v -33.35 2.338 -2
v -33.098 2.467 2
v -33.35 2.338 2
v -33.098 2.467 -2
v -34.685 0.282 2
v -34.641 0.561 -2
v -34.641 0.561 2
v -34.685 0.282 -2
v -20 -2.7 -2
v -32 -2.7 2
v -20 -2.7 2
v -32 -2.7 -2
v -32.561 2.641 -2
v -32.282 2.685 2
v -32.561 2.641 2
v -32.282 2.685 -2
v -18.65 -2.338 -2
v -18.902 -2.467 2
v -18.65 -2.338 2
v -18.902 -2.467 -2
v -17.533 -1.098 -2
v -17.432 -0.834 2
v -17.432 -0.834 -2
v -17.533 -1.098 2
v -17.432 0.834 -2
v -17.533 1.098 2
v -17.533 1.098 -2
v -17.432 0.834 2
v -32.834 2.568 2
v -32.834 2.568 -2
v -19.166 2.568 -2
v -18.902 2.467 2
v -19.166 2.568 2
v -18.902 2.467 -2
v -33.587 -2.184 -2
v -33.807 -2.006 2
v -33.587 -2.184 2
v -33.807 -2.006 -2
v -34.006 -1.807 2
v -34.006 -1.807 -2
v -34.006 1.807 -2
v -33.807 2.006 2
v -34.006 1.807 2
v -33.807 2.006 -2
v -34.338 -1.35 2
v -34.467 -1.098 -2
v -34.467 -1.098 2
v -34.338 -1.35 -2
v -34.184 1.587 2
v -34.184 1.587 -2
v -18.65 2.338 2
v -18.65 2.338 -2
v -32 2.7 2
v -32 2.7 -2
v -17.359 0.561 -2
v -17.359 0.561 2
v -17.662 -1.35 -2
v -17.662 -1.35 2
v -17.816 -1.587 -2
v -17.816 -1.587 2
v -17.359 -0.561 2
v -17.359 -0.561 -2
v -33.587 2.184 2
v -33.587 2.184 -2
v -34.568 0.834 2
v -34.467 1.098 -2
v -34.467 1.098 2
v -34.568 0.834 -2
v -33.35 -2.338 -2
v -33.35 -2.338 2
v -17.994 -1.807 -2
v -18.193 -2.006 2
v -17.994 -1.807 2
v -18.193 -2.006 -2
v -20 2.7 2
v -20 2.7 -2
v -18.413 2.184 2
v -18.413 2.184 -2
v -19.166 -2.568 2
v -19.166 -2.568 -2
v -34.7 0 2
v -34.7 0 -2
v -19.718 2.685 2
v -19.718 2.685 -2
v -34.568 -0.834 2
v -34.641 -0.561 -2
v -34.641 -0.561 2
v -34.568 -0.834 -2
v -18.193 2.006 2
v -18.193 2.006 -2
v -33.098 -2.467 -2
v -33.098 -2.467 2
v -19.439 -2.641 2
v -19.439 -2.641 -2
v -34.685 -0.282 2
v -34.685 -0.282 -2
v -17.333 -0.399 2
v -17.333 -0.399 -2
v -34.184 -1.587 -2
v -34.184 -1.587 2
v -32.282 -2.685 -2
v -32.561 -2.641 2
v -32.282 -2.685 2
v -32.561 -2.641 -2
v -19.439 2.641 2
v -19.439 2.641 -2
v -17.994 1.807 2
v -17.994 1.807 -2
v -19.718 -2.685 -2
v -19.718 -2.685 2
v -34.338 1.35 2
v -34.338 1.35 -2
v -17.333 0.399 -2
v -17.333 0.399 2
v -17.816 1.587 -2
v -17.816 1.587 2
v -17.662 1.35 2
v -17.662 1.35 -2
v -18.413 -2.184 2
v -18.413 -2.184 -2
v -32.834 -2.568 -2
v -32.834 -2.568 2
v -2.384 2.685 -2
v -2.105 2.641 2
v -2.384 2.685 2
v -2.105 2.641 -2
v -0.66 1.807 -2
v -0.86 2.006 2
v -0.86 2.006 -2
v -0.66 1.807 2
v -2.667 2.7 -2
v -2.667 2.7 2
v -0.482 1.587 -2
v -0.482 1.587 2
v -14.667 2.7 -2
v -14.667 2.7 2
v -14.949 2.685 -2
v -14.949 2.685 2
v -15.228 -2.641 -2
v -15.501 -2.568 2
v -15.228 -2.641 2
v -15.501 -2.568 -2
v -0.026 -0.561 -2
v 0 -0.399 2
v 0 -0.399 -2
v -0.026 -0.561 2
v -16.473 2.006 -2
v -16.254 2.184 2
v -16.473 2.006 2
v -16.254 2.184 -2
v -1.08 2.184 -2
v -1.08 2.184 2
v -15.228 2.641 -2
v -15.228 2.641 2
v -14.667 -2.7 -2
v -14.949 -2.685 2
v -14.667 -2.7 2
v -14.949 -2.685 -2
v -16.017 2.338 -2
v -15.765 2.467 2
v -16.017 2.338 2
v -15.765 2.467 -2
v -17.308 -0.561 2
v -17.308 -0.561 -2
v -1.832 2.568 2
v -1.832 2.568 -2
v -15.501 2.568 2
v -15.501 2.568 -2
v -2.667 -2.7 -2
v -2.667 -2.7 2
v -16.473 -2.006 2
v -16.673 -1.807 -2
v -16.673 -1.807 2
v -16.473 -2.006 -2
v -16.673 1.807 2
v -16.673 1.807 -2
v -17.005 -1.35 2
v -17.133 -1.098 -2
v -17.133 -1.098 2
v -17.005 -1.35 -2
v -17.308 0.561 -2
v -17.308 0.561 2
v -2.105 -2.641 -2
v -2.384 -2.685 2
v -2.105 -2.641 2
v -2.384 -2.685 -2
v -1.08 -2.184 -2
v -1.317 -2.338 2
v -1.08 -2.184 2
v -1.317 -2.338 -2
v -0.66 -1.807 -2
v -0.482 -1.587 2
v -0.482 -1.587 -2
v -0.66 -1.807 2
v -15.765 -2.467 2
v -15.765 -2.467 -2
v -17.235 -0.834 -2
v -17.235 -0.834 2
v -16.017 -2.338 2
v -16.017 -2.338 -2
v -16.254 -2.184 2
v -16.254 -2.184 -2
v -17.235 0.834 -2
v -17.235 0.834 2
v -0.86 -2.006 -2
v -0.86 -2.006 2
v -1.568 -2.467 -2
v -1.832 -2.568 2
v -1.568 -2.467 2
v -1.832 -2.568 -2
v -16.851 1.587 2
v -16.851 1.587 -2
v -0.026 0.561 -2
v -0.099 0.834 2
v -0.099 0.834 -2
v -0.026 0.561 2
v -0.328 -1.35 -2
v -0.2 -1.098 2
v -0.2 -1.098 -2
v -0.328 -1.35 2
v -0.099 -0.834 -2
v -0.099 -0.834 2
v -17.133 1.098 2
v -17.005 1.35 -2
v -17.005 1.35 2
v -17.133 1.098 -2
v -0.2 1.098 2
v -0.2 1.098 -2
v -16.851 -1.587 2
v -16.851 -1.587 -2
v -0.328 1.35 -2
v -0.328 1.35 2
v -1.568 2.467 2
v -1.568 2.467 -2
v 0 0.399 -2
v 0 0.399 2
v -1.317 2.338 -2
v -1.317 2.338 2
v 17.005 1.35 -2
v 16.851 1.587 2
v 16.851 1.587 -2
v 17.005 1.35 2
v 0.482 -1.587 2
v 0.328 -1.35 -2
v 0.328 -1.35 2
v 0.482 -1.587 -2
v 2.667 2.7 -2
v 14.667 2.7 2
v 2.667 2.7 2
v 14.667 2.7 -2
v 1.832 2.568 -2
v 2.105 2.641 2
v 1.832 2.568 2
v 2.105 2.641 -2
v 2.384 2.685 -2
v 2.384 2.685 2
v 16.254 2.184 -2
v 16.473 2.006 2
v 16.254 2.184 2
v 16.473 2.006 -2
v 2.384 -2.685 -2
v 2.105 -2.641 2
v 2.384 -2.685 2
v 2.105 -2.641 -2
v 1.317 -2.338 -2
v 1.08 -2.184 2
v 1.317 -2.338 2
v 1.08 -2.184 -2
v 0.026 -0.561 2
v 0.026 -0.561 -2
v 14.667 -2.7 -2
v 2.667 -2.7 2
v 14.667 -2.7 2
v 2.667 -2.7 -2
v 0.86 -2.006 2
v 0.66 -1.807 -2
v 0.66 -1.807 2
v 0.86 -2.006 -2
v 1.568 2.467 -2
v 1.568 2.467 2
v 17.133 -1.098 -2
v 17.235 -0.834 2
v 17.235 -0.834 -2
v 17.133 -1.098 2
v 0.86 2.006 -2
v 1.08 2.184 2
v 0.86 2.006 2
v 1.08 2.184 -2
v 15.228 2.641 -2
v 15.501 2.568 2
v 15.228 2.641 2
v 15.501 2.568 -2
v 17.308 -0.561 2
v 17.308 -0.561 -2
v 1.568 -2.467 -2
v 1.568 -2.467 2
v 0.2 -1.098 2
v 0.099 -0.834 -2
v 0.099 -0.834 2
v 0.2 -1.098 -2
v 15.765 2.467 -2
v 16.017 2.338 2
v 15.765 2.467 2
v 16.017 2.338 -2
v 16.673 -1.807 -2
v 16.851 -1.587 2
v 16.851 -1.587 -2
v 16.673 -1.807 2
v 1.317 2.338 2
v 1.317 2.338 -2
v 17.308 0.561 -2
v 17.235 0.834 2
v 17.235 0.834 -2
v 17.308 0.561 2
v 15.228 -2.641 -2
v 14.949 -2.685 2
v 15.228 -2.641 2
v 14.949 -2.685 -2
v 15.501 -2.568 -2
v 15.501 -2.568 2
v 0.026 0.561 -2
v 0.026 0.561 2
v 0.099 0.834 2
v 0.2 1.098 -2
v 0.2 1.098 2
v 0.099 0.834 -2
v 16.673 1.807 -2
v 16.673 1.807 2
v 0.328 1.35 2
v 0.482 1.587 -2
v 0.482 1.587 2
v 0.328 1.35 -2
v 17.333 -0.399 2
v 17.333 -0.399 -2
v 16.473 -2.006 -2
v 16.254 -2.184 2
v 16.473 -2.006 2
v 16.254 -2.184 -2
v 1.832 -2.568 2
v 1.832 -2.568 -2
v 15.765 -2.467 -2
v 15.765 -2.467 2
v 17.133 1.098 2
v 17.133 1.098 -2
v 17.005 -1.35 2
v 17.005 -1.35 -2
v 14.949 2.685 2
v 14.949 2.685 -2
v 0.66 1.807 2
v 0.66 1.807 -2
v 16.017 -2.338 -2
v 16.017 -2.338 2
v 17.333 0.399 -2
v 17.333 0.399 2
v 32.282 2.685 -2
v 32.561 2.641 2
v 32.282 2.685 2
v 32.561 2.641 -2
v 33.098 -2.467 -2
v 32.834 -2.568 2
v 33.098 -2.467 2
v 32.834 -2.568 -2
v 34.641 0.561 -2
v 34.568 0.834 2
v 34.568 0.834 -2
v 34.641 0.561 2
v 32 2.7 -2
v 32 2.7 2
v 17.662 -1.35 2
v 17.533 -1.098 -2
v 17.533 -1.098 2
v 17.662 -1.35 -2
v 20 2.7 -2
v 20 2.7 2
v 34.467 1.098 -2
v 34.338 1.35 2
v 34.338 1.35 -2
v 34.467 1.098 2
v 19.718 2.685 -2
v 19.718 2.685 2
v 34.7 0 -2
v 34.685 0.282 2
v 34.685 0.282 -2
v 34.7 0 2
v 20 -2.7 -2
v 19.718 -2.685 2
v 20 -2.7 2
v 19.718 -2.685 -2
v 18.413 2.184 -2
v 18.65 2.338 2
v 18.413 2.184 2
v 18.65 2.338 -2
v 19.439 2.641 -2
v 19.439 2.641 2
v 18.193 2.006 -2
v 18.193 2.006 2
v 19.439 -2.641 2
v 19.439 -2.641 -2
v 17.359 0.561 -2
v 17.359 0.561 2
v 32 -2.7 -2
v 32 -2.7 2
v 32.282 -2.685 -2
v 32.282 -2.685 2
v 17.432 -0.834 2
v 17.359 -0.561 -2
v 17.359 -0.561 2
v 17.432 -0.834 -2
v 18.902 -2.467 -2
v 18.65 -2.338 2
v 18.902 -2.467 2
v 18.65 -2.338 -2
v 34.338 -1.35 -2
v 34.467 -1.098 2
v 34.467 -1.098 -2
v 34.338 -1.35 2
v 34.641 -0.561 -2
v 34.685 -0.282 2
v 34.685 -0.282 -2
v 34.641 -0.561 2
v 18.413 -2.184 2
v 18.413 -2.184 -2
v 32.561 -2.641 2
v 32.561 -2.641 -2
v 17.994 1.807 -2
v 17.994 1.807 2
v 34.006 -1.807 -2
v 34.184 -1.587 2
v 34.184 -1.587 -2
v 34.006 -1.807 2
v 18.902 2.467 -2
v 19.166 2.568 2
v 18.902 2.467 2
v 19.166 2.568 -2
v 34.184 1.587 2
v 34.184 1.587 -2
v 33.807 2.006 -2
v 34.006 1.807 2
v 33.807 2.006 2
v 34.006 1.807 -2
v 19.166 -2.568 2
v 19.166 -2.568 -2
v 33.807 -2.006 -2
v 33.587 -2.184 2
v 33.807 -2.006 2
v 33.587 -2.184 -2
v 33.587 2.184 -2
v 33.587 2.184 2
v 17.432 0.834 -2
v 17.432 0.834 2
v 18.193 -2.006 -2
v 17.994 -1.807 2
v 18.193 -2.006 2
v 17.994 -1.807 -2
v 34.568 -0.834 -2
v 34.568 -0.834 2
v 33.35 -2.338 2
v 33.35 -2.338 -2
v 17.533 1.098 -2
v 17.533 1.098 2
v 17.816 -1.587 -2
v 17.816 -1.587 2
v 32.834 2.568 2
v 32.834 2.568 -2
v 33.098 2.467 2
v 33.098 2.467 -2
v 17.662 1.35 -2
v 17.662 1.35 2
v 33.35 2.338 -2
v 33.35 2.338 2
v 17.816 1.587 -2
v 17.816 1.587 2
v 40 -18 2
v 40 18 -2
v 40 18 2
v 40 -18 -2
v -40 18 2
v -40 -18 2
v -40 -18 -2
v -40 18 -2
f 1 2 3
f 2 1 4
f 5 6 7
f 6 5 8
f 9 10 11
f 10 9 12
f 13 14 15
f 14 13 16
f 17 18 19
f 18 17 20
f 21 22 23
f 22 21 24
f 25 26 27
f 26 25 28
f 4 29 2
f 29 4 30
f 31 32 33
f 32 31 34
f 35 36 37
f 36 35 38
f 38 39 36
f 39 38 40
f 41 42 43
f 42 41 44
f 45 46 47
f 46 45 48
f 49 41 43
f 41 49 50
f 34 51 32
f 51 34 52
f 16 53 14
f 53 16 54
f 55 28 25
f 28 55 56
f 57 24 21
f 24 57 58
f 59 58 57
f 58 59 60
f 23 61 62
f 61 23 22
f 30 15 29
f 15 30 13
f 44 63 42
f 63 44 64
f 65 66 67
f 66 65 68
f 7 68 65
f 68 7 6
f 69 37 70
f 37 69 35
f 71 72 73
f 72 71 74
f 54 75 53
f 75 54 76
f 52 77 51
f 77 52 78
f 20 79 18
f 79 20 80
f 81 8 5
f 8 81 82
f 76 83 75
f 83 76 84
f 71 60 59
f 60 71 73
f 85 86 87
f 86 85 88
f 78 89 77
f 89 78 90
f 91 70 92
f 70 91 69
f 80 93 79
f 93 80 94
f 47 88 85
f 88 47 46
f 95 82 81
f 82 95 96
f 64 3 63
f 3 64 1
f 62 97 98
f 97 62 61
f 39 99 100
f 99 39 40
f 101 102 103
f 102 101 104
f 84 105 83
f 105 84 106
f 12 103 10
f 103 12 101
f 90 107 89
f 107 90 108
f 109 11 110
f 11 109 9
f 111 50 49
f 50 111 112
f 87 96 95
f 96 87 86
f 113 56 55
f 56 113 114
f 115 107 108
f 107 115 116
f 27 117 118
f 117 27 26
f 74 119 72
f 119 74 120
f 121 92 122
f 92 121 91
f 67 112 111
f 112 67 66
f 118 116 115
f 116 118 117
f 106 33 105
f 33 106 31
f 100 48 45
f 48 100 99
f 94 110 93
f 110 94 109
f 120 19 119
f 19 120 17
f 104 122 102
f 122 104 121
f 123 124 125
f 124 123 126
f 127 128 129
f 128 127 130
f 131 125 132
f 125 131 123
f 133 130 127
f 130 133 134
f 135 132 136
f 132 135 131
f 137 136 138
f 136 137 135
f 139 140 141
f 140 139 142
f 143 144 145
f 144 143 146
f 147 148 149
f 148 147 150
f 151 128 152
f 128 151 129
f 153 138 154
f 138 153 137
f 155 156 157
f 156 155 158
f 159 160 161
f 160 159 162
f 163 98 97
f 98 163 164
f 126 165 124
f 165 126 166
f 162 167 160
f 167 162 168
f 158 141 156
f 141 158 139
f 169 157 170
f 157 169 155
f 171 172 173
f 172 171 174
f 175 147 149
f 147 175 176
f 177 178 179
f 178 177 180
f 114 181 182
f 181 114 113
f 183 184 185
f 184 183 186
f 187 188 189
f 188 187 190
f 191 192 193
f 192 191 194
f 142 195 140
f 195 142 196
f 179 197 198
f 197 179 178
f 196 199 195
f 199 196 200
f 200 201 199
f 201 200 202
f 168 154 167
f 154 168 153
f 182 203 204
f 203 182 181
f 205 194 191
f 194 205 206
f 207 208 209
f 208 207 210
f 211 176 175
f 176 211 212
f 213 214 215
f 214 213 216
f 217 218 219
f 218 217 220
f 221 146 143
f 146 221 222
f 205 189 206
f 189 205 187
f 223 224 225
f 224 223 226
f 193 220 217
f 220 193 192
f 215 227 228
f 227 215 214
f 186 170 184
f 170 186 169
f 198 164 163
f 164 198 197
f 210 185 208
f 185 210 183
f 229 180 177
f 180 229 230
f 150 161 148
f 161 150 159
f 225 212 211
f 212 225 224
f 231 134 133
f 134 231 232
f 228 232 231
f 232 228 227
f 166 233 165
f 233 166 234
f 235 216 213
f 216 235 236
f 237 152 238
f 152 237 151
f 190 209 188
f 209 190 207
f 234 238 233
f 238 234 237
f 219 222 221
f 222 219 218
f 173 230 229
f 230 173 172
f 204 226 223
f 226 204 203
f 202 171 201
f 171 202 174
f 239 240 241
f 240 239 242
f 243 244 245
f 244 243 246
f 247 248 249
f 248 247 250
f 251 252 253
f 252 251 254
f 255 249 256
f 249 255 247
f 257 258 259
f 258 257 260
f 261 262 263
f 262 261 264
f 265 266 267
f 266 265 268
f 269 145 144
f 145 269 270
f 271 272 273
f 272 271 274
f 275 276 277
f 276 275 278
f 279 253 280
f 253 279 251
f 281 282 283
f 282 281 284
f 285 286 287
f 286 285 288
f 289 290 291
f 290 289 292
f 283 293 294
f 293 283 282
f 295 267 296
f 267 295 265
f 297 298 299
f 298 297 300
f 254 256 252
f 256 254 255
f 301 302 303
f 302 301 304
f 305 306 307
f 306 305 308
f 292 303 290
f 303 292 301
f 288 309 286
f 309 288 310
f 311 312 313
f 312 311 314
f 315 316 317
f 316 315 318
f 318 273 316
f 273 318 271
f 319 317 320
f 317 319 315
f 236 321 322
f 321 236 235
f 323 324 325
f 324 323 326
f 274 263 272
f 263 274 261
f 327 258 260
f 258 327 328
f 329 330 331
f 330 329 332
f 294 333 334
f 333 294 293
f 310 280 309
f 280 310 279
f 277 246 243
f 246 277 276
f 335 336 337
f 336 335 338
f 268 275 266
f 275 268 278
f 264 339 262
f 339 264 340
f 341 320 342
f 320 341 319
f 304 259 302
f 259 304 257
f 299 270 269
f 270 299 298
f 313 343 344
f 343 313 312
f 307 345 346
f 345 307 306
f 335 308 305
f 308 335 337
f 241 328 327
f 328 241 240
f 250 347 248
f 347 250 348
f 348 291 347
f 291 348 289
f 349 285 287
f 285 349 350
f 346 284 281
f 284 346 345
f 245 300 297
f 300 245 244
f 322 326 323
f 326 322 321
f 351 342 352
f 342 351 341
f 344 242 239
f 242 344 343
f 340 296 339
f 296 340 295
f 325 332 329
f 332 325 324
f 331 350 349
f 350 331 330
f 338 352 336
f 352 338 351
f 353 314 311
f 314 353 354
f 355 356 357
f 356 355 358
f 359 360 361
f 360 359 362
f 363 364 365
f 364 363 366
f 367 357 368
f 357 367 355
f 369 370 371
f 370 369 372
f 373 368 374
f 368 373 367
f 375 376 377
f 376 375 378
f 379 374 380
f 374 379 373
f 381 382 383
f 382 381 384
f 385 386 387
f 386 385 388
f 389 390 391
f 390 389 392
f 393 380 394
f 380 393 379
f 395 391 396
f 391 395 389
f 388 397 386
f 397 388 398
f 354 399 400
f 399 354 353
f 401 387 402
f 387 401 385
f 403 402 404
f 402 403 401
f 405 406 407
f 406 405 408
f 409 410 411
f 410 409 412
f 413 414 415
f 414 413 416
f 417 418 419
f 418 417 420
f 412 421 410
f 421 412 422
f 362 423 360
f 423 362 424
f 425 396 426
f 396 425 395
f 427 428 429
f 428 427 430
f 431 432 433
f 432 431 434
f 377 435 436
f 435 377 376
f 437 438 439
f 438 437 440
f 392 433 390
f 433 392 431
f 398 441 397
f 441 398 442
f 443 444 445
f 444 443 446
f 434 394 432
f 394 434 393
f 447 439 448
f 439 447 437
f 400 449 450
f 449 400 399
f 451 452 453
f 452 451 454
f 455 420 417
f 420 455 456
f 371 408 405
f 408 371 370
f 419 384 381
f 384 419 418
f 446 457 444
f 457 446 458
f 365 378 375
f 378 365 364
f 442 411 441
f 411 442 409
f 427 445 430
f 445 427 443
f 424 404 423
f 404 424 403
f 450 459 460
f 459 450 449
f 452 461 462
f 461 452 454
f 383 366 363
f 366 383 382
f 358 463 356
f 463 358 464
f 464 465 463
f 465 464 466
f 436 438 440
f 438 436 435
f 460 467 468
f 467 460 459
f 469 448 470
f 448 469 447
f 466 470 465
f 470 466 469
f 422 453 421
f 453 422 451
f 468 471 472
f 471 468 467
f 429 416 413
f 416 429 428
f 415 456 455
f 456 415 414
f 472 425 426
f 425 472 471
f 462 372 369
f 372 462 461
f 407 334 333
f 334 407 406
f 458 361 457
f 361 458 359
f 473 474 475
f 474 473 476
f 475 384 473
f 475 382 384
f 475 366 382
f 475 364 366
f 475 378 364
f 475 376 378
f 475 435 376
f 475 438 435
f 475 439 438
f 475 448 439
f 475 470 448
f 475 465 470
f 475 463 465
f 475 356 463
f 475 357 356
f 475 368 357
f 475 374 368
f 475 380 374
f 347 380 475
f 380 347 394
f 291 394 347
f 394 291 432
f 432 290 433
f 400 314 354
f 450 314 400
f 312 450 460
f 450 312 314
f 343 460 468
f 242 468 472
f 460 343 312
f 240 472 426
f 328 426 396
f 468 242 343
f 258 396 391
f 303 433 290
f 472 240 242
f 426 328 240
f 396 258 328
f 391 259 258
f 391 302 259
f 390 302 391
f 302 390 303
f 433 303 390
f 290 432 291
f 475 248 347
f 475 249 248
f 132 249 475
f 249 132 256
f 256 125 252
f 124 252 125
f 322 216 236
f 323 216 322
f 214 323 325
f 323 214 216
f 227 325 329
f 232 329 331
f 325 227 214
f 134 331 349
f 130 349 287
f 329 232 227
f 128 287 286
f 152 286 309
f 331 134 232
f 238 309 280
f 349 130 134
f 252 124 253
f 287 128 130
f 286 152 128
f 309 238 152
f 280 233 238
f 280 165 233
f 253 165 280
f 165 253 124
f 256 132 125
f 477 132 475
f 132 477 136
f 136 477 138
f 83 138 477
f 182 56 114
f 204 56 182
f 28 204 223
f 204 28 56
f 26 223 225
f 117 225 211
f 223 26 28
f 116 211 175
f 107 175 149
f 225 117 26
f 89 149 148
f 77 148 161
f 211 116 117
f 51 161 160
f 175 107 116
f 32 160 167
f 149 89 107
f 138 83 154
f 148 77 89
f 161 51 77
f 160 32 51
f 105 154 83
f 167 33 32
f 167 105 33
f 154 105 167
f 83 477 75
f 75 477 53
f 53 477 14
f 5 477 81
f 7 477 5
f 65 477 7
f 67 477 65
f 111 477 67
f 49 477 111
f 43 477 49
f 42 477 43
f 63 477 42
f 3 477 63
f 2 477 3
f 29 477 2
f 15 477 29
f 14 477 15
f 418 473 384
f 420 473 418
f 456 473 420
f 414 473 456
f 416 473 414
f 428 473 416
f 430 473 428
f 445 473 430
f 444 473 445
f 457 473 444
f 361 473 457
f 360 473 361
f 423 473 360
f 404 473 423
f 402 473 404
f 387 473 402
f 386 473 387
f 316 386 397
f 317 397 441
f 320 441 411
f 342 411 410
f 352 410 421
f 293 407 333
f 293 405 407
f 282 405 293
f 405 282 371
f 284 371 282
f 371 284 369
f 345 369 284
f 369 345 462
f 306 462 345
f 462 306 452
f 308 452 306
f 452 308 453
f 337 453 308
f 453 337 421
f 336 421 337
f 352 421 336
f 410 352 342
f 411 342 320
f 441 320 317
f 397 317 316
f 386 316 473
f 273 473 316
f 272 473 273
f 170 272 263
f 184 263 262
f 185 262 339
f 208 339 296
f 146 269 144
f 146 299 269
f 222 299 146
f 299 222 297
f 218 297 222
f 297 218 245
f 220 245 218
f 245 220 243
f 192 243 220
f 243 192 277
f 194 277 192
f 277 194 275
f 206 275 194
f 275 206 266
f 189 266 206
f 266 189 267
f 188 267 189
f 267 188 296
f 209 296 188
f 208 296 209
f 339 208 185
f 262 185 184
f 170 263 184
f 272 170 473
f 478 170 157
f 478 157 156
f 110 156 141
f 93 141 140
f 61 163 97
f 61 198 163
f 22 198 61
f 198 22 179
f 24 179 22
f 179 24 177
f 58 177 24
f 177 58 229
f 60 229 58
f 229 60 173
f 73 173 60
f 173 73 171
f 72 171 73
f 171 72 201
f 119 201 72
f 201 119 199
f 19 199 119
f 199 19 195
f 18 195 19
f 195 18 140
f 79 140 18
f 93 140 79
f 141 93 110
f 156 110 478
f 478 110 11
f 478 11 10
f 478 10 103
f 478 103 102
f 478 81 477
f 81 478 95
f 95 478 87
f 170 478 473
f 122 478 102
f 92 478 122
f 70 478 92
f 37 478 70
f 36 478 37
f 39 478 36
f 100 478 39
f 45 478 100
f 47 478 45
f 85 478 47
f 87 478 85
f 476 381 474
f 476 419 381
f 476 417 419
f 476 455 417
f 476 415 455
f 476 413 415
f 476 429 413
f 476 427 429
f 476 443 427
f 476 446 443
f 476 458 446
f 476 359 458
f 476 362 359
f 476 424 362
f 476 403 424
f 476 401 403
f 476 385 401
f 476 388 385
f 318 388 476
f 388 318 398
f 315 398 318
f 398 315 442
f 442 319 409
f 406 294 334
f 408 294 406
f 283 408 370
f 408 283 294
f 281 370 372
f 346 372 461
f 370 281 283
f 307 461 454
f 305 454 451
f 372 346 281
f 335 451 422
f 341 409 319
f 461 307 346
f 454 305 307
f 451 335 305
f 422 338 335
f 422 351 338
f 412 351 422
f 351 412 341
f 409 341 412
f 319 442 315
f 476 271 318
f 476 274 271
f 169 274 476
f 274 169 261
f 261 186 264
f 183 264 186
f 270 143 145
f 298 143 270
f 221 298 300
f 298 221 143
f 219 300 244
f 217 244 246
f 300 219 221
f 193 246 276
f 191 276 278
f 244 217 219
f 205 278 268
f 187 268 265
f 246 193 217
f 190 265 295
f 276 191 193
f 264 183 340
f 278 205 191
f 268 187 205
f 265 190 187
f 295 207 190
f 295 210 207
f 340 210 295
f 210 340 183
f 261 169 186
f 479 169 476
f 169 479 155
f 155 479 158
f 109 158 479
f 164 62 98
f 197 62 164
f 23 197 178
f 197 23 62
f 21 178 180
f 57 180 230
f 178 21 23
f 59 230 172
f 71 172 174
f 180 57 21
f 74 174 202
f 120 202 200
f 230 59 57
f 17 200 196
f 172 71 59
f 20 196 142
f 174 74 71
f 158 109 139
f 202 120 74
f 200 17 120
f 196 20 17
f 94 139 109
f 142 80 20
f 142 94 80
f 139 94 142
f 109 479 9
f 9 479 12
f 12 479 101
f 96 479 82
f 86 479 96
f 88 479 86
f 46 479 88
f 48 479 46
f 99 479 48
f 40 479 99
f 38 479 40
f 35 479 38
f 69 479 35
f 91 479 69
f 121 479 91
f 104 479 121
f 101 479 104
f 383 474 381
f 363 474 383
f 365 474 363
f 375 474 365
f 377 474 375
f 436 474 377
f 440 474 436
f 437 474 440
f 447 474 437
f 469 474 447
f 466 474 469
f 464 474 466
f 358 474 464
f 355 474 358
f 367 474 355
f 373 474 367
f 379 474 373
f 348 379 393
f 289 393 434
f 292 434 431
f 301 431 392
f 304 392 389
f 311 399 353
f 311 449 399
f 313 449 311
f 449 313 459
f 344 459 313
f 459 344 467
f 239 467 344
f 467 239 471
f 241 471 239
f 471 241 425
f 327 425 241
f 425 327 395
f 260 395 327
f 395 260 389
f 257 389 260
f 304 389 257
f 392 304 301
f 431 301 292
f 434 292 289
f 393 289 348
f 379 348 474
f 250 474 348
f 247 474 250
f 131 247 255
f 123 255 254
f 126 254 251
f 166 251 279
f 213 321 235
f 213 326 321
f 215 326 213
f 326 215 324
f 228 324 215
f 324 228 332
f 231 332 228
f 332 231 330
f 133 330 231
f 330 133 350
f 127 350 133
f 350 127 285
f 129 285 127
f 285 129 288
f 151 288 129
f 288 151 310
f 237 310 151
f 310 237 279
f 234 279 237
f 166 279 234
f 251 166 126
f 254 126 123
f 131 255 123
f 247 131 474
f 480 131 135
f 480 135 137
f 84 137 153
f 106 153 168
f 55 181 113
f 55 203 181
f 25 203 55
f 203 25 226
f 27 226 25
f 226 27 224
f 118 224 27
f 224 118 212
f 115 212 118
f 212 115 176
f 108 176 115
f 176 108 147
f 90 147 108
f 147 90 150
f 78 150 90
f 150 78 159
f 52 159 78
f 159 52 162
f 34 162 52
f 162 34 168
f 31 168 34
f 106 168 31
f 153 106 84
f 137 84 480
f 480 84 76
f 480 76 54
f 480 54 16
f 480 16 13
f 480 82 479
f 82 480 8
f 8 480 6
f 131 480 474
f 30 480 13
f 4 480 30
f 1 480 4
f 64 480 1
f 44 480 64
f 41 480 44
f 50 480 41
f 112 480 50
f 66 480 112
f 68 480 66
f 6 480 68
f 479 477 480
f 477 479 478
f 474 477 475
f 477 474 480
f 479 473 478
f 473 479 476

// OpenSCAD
// Slotted mounting plate.
$fn = 60;
eps = 0.02;
plate_l = 80;
plate_w = 36;
plate_t = 4;
slot_l = 12;
module slot(x) { hull() { translate([x-slot_l/2,0,-plate_t/2-eps]) cylinder(d=5.4,h=plate_t+2*eps); translate([x+slot_l/2,0,-plate_t/2-eps]) cylinder(d=5.4,h=plate_t+2*eps); } }
difference() { cube([plate_l,plate_w,plate_t],center=true); for(i=[0:3]) slot(-plate_l/2+14+i*(plate_l-28)/max(1,3)); }
